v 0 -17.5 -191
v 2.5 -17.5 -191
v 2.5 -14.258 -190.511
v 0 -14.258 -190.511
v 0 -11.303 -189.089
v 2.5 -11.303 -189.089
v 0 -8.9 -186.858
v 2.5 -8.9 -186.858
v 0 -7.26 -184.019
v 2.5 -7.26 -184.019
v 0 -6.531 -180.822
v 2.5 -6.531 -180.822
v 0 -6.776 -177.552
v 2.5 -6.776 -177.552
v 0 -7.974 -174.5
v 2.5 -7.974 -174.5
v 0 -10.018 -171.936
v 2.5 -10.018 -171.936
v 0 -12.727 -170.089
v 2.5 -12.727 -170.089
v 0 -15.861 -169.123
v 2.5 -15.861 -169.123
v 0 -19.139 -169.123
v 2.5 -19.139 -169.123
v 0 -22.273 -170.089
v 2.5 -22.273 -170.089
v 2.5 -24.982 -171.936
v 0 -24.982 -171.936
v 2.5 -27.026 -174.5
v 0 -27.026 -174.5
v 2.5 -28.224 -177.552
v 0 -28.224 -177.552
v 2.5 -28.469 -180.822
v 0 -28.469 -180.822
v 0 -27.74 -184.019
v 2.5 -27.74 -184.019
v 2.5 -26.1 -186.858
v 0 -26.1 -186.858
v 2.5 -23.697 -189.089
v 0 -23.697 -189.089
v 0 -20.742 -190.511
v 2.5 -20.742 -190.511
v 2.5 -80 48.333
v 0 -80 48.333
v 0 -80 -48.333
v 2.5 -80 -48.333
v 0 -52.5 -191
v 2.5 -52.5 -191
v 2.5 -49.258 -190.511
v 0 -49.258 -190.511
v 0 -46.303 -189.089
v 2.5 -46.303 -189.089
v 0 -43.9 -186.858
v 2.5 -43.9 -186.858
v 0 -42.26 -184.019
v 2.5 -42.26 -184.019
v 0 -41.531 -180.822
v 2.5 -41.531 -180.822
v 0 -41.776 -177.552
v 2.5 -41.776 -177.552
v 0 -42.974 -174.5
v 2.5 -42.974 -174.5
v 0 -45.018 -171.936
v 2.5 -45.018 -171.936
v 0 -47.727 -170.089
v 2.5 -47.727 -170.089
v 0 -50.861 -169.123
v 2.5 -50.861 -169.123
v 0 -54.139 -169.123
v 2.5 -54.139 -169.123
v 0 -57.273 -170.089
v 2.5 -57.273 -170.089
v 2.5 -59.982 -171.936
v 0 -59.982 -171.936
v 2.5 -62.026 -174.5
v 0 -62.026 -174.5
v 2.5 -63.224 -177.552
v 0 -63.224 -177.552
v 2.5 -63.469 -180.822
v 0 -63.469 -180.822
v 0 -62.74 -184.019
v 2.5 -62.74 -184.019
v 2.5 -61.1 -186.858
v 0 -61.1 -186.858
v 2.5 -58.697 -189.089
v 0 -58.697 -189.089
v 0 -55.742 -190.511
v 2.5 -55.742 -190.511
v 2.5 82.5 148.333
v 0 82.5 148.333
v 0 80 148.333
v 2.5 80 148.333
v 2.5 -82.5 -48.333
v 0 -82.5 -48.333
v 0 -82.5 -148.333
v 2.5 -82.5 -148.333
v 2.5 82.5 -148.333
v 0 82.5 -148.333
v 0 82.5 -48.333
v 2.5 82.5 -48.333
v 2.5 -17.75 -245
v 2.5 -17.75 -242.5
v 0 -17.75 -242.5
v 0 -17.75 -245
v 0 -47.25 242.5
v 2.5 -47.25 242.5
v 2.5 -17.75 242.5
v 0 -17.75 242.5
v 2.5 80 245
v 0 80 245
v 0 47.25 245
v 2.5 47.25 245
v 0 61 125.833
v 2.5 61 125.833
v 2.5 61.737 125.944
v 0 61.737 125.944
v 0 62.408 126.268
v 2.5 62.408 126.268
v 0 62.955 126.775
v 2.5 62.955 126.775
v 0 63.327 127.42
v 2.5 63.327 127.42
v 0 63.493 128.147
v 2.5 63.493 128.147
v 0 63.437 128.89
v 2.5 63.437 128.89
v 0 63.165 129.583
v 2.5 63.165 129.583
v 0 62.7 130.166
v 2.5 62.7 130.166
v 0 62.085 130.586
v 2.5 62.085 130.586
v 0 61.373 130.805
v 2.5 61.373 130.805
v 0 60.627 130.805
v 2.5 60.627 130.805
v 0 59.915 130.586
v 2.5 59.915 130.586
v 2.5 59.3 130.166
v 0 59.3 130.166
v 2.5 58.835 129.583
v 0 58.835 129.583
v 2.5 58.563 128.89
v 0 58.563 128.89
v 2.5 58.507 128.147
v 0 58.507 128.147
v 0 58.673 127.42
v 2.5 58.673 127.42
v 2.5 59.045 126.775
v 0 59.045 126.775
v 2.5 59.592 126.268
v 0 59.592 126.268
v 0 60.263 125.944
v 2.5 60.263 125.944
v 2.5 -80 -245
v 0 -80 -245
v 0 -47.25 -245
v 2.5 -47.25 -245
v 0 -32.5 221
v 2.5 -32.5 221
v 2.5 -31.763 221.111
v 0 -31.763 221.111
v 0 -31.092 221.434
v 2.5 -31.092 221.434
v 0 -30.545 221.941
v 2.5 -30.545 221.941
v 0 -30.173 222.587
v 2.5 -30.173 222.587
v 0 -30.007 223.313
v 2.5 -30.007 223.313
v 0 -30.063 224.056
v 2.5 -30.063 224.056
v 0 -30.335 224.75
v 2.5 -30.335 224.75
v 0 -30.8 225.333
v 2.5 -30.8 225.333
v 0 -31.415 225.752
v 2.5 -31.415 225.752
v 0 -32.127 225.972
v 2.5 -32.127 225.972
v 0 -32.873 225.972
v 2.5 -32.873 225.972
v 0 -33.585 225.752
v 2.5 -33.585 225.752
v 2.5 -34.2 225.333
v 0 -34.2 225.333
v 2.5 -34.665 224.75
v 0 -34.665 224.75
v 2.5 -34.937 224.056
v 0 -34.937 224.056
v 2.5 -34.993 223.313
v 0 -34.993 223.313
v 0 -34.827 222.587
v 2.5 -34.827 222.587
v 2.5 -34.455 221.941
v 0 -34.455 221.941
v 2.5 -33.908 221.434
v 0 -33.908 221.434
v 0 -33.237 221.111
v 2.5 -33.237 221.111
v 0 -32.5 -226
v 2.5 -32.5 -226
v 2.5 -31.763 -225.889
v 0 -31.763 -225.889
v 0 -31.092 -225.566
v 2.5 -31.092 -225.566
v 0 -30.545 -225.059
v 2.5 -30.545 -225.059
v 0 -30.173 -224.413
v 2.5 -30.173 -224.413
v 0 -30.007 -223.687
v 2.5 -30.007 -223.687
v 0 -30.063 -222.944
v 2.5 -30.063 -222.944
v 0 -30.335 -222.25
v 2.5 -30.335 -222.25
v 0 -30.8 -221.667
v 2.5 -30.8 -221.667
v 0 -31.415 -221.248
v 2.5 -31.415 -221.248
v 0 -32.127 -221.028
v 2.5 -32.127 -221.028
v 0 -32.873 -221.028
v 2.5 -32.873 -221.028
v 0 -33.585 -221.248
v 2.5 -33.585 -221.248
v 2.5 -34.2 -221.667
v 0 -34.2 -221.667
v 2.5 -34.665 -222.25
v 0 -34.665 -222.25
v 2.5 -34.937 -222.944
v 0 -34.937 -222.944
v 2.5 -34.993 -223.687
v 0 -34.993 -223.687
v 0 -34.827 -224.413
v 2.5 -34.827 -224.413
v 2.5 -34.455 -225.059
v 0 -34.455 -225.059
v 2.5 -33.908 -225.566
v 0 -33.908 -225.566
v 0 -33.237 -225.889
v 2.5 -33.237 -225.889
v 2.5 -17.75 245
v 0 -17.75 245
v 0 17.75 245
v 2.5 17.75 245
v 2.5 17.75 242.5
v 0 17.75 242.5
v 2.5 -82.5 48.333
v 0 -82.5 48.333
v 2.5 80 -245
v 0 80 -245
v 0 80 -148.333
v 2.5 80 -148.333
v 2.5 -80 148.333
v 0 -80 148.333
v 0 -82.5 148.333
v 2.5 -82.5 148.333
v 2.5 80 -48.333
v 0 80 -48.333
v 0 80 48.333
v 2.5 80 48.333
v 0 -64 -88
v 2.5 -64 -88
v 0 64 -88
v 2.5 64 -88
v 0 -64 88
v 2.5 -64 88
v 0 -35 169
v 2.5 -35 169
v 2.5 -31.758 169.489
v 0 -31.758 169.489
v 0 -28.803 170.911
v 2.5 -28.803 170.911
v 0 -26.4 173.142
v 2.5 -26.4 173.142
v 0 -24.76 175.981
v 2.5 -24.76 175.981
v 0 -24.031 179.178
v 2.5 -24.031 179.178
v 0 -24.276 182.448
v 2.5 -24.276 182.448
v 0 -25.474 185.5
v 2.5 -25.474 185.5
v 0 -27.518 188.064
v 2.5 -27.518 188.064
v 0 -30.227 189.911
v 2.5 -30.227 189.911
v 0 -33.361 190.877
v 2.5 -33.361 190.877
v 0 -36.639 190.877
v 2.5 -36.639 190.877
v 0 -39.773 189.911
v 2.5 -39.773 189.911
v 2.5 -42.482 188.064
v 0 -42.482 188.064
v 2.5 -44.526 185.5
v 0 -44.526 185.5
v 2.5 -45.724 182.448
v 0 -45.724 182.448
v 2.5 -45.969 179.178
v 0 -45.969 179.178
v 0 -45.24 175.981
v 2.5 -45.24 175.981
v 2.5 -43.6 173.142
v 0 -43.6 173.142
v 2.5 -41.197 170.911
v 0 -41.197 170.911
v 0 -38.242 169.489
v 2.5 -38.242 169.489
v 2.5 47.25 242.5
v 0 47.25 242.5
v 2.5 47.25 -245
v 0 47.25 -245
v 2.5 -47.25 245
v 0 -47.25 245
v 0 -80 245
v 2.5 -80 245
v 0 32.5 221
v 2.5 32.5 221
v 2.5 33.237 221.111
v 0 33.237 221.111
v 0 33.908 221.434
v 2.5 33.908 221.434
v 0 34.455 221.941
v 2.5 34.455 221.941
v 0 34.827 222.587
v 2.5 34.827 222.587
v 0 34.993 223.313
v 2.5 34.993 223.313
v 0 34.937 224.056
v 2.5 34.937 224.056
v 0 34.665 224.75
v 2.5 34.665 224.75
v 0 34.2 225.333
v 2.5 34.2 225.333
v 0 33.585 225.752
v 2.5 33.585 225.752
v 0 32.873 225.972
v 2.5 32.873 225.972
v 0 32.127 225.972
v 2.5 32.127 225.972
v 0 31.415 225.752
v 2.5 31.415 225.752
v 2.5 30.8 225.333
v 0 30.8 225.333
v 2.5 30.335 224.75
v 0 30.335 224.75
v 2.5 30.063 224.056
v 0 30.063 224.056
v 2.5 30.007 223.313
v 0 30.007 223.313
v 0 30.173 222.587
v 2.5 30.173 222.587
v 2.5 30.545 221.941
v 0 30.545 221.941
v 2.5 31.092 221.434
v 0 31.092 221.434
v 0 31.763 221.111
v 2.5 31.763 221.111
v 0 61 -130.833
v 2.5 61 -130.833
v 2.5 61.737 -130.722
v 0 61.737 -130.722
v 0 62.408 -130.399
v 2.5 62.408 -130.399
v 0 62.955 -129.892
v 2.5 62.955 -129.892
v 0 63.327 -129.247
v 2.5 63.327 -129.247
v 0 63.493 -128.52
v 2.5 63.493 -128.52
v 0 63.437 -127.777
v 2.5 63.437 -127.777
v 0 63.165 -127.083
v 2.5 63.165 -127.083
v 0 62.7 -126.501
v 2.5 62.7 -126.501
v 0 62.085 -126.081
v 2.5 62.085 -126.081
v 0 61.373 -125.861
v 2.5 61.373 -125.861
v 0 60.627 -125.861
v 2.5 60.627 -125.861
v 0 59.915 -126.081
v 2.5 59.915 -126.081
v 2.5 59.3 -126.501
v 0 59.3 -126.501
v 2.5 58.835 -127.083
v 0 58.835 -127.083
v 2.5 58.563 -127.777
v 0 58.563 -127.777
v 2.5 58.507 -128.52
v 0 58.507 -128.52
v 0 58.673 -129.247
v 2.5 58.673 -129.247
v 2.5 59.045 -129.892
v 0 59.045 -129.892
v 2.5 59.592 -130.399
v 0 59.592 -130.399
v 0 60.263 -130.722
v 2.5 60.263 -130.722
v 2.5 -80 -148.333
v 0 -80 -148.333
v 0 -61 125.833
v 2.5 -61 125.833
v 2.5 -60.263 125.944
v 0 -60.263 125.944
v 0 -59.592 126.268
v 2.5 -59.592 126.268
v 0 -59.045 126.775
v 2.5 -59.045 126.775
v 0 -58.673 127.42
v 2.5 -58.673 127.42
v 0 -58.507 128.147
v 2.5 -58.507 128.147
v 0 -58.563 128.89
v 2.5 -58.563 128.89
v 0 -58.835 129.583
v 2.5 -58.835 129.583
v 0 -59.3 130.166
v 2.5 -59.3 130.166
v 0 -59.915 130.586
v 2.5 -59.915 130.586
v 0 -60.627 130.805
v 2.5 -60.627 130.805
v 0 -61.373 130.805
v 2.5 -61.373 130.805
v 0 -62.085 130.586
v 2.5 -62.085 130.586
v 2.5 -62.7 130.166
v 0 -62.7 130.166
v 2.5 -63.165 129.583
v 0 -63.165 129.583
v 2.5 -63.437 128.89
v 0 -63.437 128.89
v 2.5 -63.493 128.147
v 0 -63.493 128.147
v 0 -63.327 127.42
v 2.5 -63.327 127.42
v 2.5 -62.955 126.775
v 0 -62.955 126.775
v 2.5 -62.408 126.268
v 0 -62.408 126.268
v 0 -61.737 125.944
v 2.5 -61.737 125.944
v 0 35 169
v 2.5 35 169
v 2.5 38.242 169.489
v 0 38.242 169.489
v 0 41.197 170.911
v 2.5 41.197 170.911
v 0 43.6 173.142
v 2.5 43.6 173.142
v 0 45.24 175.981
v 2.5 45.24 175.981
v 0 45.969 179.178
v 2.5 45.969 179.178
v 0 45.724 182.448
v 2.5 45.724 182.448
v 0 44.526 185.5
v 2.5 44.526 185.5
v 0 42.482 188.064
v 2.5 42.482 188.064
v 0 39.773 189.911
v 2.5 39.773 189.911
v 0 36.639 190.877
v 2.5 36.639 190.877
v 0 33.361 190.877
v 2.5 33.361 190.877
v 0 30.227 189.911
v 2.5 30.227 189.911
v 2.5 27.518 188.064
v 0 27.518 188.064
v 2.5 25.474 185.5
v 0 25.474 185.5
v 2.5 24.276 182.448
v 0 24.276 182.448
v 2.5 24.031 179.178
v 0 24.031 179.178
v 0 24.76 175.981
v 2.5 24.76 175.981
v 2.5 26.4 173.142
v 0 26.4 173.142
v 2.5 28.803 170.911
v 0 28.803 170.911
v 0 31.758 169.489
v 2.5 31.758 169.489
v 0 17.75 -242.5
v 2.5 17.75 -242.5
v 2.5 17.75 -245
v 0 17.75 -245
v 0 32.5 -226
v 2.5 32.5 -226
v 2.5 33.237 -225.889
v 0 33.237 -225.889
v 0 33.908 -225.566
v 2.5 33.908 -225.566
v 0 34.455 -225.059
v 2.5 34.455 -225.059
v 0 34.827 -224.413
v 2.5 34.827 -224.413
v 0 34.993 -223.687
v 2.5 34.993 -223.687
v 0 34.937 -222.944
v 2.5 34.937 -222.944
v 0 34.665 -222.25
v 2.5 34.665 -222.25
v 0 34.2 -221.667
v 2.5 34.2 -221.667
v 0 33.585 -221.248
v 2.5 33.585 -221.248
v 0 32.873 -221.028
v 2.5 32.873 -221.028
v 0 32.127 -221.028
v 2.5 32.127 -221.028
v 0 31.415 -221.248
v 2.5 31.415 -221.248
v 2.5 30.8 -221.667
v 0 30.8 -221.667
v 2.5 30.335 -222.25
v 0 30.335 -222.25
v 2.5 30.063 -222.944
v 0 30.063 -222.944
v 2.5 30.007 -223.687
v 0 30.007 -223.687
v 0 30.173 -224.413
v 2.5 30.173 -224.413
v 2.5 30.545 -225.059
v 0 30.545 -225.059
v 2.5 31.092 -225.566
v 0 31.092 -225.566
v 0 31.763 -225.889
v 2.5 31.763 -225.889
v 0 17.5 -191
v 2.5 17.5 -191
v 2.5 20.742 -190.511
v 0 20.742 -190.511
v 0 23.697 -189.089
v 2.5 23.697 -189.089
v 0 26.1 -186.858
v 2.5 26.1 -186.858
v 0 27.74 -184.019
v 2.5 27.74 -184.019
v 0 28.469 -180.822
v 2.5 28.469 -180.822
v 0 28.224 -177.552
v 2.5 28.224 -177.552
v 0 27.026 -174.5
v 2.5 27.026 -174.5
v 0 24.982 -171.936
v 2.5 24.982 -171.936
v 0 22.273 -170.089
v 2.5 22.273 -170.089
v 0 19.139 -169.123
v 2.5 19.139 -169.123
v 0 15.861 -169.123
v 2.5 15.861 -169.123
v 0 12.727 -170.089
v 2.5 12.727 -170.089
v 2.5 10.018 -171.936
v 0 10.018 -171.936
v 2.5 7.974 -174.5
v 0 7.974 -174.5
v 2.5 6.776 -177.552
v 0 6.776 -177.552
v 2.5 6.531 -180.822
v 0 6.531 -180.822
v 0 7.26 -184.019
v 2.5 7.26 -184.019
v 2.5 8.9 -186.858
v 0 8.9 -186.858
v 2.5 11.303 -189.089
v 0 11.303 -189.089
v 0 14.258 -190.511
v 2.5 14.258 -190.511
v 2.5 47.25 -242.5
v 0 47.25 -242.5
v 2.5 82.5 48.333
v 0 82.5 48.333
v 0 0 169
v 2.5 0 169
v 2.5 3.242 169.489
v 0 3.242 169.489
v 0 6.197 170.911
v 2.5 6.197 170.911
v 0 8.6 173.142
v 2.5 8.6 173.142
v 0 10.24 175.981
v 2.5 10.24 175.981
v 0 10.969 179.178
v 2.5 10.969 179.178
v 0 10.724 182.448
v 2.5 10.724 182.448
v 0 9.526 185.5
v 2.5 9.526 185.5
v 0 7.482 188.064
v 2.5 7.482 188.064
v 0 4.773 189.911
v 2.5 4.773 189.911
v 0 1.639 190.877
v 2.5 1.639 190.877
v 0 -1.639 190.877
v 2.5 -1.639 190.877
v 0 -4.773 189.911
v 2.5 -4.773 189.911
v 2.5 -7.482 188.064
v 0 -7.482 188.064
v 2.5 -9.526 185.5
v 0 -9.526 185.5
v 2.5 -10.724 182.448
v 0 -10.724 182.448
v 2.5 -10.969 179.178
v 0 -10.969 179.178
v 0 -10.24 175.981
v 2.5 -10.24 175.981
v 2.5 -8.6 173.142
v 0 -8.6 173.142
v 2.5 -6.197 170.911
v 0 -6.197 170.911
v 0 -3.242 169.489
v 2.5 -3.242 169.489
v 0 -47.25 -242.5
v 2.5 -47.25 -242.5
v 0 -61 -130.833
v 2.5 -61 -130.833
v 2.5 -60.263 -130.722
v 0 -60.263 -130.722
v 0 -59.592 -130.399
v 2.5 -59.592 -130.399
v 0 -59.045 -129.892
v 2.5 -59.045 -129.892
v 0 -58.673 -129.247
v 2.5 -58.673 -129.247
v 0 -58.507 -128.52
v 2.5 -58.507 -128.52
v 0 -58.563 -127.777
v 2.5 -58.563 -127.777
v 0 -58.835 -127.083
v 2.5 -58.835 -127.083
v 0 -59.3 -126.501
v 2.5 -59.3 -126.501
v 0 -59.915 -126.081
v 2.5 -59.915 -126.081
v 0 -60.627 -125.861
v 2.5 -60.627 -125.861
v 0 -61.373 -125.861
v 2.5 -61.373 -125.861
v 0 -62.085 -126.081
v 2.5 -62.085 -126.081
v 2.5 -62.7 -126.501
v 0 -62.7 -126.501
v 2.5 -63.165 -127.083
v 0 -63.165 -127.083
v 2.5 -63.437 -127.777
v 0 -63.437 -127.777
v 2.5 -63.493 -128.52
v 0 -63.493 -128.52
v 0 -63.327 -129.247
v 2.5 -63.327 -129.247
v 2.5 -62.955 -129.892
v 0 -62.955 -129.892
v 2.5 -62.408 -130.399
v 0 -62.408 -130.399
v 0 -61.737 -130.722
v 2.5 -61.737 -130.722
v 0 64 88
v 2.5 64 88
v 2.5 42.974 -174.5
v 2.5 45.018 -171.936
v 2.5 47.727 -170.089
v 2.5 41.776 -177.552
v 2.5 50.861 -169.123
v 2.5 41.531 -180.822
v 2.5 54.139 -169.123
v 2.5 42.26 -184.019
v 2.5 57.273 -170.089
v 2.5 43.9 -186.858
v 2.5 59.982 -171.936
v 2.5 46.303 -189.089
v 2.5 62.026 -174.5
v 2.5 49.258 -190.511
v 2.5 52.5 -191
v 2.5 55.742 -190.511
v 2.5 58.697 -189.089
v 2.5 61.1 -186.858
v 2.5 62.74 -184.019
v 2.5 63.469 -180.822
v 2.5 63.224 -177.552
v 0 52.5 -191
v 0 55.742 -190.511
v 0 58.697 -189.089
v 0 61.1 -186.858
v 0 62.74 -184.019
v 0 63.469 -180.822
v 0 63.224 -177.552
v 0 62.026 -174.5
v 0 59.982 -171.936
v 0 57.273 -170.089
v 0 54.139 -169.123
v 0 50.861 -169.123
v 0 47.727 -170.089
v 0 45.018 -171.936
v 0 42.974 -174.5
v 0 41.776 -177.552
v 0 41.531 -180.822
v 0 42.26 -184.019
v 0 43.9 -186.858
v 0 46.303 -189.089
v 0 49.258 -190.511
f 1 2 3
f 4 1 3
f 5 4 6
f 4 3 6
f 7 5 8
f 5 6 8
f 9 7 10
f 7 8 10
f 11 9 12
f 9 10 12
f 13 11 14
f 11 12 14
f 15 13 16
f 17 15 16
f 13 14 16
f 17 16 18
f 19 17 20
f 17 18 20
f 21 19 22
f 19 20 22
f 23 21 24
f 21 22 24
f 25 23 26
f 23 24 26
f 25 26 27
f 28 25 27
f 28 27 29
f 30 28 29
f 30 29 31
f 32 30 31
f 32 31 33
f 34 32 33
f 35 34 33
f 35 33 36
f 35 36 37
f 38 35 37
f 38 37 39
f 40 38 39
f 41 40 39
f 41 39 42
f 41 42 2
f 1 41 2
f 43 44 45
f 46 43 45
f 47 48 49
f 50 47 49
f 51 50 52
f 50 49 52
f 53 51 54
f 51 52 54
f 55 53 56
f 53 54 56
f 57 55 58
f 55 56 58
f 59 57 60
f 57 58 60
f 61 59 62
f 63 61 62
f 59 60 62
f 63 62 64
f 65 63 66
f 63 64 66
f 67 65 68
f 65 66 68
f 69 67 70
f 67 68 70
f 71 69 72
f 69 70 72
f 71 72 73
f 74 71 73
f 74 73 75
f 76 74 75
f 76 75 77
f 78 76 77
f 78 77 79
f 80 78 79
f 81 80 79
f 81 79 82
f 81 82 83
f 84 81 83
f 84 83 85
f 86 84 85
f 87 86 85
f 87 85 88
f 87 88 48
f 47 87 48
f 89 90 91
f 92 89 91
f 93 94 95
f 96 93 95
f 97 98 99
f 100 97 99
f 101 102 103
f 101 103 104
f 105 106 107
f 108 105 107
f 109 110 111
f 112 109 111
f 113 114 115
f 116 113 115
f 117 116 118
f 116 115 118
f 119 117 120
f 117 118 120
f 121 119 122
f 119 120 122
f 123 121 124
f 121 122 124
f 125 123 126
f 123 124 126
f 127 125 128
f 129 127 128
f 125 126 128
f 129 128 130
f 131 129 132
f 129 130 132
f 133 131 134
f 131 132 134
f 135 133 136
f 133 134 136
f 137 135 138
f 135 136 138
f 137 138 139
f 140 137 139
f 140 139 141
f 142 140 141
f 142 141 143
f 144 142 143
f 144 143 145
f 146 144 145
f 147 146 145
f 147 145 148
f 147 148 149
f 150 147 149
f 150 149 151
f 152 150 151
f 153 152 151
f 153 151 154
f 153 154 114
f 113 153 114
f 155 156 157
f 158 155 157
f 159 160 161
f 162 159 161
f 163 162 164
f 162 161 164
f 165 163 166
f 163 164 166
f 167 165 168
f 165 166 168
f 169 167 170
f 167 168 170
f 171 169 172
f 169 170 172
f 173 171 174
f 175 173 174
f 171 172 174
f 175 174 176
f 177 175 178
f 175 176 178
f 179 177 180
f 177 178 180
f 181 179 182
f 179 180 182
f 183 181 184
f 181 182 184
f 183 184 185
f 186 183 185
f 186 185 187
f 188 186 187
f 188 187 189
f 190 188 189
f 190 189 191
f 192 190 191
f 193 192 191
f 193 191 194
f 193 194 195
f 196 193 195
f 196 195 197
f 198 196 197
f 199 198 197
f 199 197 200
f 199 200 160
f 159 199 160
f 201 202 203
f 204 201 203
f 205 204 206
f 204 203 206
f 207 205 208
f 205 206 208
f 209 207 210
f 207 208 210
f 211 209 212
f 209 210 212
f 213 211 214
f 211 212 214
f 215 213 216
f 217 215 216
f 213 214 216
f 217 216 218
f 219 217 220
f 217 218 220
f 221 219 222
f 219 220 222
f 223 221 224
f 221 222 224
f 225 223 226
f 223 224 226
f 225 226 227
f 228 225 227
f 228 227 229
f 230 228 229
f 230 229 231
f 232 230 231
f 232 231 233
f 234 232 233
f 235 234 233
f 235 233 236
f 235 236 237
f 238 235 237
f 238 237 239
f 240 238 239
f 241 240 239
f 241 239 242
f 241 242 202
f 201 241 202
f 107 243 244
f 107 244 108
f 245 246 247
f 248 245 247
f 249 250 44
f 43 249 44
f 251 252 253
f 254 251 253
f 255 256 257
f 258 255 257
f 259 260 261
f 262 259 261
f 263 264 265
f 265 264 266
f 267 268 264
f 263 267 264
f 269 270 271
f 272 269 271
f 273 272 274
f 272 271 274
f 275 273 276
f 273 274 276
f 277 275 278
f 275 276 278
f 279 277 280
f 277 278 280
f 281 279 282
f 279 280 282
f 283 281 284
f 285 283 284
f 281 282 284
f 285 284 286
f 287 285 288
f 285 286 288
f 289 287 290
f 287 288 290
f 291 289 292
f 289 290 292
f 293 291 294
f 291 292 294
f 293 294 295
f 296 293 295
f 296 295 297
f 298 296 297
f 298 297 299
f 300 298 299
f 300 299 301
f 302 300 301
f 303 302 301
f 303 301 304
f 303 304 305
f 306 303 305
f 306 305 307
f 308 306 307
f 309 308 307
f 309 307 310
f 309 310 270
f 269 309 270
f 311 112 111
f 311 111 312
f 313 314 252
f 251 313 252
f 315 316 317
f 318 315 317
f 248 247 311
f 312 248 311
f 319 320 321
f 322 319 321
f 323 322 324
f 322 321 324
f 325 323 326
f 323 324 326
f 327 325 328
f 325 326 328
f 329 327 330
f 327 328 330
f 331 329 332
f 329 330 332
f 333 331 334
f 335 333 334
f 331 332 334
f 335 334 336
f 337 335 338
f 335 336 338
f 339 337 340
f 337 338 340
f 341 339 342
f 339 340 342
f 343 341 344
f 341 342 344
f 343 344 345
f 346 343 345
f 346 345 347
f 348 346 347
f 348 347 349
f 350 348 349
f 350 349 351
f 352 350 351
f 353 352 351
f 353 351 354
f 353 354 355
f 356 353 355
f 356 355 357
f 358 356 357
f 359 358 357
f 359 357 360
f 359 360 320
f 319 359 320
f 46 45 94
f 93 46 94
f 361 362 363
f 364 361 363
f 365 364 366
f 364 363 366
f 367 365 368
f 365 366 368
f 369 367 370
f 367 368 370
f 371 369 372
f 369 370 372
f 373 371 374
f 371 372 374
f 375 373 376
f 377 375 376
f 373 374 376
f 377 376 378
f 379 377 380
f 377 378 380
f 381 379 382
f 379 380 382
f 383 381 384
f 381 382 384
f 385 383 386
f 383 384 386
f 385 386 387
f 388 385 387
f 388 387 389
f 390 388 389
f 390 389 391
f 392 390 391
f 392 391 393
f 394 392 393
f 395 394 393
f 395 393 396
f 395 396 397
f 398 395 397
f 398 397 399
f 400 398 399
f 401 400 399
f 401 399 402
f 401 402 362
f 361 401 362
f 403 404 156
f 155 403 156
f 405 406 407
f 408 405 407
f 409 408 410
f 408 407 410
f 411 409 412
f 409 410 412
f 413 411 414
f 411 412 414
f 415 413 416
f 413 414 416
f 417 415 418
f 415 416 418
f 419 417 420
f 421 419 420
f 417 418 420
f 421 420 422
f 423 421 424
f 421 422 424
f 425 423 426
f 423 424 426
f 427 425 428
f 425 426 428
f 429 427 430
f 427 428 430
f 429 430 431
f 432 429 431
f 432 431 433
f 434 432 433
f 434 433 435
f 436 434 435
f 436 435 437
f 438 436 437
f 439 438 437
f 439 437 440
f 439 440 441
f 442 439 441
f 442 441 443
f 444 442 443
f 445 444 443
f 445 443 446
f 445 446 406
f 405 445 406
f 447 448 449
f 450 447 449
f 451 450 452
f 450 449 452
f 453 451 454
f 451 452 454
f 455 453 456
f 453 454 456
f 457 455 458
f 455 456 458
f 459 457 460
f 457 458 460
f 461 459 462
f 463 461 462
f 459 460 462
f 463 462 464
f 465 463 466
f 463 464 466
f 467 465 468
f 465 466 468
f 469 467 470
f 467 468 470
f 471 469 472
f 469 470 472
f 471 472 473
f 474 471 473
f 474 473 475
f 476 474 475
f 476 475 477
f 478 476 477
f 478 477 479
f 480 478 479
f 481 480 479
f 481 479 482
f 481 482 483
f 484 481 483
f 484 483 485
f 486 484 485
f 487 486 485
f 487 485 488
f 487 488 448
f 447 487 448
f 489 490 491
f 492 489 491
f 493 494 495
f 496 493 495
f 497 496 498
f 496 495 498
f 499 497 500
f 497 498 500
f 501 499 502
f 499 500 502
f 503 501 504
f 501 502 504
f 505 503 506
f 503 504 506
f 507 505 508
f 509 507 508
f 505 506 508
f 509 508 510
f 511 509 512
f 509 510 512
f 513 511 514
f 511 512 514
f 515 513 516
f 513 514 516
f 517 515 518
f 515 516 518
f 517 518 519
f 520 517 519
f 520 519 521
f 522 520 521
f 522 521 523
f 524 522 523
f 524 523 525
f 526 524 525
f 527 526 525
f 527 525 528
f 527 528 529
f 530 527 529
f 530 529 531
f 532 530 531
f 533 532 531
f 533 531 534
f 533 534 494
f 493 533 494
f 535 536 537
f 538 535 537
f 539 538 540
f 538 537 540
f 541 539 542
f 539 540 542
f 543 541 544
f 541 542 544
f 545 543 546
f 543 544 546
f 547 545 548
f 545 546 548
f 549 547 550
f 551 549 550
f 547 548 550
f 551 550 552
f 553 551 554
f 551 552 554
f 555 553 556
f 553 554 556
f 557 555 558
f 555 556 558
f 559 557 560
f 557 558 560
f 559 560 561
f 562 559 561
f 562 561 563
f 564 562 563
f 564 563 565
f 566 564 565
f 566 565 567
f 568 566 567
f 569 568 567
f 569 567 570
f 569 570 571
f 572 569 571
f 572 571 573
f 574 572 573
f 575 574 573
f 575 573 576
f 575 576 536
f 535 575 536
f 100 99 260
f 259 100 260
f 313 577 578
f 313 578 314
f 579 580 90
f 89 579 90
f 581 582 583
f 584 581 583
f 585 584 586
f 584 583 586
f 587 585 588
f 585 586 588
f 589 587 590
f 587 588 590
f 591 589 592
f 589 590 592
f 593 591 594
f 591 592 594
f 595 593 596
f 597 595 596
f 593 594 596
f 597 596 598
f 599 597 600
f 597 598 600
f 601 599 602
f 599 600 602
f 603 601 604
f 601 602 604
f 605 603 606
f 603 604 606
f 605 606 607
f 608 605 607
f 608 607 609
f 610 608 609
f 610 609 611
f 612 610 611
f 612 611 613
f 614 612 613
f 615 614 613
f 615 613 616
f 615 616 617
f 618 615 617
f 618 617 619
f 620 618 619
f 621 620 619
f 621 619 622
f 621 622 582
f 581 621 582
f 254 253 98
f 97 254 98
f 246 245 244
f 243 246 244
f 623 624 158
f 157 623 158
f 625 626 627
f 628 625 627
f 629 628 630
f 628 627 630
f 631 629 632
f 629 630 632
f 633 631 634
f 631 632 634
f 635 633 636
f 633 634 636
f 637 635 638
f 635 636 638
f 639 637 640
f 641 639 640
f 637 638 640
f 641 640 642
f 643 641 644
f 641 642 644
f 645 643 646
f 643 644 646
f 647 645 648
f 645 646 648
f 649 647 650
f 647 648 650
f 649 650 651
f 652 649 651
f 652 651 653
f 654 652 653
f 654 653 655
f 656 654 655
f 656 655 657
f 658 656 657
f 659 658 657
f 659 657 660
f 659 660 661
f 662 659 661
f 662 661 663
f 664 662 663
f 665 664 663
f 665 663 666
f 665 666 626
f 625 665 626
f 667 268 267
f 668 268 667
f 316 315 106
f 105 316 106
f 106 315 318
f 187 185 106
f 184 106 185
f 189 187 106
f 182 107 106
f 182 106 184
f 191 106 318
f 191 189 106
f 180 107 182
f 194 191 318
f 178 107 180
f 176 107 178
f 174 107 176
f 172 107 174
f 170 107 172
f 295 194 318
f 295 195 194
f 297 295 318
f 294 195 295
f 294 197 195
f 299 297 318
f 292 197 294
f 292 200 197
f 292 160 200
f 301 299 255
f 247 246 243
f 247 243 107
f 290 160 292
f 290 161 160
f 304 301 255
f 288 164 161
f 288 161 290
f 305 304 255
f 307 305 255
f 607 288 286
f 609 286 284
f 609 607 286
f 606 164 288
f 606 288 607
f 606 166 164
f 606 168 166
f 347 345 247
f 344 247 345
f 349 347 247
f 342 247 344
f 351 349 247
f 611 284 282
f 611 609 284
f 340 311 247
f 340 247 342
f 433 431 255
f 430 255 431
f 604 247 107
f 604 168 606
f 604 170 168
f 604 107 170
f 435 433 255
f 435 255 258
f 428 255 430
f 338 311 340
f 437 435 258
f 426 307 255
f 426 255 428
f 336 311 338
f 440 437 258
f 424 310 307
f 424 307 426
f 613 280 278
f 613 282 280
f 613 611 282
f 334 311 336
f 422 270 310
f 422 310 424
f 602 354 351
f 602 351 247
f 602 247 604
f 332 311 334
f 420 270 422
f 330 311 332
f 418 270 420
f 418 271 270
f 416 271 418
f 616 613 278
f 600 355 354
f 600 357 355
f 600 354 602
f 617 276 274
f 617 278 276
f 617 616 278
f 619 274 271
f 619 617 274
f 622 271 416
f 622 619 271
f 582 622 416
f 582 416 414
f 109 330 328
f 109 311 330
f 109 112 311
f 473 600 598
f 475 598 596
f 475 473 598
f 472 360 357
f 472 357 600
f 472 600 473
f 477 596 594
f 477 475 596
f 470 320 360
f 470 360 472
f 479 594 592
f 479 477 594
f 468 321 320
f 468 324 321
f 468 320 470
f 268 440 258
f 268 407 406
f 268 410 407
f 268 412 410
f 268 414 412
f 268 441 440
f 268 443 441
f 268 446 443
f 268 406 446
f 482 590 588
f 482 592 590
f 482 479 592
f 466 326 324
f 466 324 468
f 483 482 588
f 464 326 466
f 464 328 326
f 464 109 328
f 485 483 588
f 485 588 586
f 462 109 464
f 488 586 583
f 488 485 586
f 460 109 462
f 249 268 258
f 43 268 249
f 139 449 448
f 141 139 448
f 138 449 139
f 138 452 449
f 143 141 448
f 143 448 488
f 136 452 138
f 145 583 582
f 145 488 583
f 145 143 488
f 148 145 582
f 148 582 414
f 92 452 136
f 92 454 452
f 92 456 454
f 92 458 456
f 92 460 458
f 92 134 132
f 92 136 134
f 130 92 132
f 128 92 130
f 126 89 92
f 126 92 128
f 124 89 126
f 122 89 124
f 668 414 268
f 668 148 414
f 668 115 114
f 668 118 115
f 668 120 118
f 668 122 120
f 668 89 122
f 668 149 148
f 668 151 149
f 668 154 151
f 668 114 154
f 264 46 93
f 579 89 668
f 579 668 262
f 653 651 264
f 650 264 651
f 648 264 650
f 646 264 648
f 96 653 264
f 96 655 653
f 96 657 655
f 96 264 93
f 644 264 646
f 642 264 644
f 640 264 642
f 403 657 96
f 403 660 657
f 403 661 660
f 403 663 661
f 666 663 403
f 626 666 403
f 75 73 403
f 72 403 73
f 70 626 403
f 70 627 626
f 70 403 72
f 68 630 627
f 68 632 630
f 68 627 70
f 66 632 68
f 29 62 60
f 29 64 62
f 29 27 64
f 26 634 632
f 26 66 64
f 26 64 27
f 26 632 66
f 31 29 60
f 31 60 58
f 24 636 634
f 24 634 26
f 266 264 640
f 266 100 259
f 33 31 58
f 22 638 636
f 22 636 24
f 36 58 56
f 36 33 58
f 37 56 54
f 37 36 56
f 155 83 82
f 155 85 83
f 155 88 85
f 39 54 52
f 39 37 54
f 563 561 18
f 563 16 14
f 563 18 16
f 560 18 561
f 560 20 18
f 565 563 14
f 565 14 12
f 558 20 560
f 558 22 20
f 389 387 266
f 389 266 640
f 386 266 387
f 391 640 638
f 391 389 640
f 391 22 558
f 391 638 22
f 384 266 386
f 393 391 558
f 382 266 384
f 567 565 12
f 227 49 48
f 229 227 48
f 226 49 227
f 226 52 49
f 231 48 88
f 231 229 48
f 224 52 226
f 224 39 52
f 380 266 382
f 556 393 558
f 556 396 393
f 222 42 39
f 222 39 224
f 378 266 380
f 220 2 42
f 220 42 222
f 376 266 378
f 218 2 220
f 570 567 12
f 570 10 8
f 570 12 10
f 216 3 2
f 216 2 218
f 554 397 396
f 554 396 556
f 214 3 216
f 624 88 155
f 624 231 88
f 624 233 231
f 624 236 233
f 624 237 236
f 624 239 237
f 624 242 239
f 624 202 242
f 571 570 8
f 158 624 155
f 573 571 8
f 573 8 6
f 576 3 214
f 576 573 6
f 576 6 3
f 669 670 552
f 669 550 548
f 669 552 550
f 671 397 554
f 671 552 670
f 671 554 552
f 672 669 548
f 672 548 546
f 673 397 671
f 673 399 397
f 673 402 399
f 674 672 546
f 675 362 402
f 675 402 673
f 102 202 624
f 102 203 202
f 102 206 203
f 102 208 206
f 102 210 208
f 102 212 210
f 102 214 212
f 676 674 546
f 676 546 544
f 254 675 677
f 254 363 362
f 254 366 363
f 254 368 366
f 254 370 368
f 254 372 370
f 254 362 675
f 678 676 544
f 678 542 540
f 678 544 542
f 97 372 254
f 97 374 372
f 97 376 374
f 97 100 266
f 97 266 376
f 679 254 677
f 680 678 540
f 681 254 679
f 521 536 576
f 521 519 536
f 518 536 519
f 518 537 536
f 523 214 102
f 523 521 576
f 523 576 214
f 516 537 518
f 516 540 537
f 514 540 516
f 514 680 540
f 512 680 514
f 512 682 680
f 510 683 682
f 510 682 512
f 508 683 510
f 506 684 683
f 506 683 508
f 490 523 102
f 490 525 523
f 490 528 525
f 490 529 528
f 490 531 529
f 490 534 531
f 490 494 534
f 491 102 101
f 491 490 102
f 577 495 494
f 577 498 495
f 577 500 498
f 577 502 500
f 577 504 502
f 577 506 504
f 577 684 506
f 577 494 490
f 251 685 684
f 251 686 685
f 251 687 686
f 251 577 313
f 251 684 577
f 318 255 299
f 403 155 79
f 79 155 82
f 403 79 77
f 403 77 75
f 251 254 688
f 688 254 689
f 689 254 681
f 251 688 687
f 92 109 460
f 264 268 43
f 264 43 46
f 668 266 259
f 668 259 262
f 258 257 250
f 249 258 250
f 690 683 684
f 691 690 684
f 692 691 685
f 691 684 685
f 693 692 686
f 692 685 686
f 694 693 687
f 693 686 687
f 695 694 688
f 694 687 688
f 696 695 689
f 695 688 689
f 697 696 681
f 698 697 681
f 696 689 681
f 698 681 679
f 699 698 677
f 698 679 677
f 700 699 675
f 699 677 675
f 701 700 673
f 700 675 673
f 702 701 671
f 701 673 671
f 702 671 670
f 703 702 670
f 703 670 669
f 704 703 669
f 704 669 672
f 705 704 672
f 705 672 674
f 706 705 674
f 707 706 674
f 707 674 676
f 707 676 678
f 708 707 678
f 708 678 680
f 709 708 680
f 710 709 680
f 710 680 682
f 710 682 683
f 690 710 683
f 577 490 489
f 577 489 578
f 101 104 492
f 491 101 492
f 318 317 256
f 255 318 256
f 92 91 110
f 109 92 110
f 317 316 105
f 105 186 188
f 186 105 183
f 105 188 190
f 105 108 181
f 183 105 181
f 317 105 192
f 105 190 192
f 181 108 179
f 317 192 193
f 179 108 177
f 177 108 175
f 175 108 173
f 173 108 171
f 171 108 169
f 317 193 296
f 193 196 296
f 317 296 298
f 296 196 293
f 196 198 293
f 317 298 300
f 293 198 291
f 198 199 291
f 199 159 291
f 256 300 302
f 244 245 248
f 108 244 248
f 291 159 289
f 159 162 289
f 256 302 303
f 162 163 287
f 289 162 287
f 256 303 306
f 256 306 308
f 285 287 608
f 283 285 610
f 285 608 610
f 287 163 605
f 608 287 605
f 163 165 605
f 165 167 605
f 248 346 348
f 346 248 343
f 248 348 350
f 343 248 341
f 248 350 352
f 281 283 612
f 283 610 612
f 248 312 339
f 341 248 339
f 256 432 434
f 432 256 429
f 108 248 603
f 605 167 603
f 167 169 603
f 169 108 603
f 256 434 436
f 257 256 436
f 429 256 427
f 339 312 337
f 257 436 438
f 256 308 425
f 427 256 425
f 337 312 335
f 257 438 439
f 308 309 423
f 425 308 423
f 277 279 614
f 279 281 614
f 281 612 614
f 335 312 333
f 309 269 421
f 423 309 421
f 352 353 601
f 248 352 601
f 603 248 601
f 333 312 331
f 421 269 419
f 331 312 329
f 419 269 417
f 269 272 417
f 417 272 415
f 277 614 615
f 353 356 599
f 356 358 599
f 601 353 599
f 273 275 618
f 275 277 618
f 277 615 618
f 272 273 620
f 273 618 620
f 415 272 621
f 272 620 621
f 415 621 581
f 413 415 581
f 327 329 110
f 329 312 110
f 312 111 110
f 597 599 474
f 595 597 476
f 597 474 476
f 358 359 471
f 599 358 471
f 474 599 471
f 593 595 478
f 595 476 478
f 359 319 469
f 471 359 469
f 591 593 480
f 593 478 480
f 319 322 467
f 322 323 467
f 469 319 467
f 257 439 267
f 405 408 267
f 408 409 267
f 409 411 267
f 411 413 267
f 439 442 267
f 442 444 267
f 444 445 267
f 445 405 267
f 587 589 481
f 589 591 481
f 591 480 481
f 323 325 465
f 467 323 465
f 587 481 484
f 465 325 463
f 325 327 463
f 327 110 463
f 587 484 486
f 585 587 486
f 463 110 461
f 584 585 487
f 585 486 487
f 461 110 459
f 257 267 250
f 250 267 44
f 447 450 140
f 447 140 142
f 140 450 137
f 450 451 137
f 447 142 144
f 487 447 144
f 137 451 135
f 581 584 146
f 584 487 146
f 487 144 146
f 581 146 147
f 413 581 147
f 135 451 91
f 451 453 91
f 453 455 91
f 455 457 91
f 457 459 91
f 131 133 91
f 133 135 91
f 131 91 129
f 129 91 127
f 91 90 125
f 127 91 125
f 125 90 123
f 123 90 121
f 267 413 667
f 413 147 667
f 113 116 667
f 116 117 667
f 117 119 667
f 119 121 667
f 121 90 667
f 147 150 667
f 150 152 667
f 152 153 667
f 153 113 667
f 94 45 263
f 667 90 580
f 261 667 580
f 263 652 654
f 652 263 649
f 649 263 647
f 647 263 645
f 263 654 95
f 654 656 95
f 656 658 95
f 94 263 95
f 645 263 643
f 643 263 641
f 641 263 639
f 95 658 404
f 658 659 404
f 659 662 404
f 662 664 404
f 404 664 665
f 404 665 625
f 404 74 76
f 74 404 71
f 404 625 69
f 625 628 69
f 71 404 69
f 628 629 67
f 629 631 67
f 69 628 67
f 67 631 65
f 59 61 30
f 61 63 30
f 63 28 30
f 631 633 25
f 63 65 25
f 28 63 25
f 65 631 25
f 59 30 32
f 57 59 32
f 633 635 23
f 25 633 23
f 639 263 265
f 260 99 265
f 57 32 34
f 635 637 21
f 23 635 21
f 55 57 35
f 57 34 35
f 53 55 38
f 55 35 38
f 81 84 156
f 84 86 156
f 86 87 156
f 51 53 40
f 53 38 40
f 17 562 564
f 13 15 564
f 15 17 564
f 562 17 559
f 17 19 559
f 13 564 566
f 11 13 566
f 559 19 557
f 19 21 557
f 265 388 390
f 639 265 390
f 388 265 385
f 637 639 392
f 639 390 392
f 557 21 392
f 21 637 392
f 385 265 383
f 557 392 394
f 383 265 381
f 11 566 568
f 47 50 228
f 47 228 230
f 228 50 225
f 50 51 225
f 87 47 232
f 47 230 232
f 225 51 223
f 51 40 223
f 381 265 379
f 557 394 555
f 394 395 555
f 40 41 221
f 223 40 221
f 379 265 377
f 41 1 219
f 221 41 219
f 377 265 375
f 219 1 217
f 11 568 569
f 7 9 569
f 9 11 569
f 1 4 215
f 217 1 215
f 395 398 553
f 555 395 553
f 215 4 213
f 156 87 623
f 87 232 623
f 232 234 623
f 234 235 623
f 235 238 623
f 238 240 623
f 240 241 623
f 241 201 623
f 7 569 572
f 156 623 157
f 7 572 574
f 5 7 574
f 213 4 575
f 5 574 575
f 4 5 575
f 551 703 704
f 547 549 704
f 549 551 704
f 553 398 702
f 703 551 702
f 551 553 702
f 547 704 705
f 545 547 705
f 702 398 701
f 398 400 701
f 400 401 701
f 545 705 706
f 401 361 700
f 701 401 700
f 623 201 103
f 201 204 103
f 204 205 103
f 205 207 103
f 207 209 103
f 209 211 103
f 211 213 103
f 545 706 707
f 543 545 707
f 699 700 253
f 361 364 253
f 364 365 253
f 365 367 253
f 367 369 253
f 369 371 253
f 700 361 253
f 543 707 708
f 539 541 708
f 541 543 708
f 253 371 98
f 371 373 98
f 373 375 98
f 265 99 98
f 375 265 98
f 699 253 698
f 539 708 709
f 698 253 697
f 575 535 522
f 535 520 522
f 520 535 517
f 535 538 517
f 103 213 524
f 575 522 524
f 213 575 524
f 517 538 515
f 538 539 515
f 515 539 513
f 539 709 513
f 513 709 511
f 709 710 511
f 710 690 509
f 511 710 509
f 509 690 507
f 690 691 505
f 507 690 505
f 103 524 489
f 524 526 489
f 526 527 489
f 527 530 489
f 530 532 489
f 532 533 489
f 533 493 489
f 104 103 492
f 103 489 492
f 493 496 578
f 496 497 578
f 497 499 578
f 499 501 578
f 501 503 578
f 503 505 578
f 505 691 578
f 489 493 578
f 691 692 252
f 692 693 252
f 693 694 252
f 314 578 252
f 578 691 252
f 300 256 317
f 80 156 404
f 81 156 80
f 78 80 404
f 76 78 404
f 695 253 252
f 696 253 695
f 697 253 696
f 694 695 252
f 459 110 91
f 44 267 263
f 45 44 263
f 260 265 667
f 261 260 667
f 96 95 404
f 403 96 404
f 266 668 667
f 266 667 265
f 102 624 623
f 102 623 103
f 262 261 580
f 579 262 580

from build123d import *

# Parameters (mm, degrees)
BOSS_EXTRUDE1_DEPTH = 2.5
SKETCH2_R           = 2.5
SKETCH2_R_2         = 11
SKETCH2_W           = 2.5
SKETCH2_H           = 29.5
SKETCH2_W_2         = 176
SKETCH2_H_2         = 128
CUT_EXTRUDE1_DEPTH  = 3


with BuildPart() as part:
    # Sketch1 → Boss-Extrude1 (new body)
    with BuildSketch(Plane(origin=(0, 0, 0), x_dir=(0, 0, -1), z_dir=(1, 0, 0))):
        Polygon((-245, -80), (-148.333333333, -80), (-148.333333333, -82.5), (-48.333333333, -82.5), (-48.333333333, -80), (48.333333333, -80), (48.333333333, -82.5), (148.333333333, -82.5), (148.333333333, -80), (245, -80), (245, 80), (148.333333333, 80), (148.333333333, 82.5), (48.333333333, 82.5), (48.333333333, 80), (-48.333333333, 80), (-48.333333333, 82.5), (-148.333333333, 82.5), (-148.333333333, 80), (-245, 80), align=None)
    extrude(amount=BOSS_EXTRUDE1_DEPTH)

    # Sketch2 → Cut-Extrude1 (cut)
    with BuildSketch(Plane(origin=(2.5, 0, 0), x_dir=(0, 0, -1), z_dir=(1, 0, 0))):
        with Locations((-128.333333333, 61)):
            Circle(SKETCH2_R)
        with Locations((128.333333333, 61)):
            Circle(SKETCH2_R)
        with Locations((128.333333333, -61)):
            Circle(SKETCH2_R)
        with Locations((-128.333333333, -61)):
            Circle(SKETCH2_R)
        with Locations((-223.5, 32.5)):
            Circle(SKETCH2_R)
        with Locations((-223.5, -32.5)):
            Circle(SKETCH2_R)
        with Locations((223.5, 32.5)):
            Circle(SKETCH2_R)
        with Locations((223.5, -32.5)):
            Circle(SKETCH2_R)
        with Locations((-180, 35)):
            Circle(SKETCH2_R_2)
        with Locations((-180, 0)):
            Circle(SKETCH2_R_2)
        with Locations((-180, -35)):
            Circle(SKETCH2_R_2)
        with Locations((180, 17.5)):
            Circle(SKETCH2_R_2)
        with Locations((180, 52.5)):
            Circle(SKETCH2_R_2)
        with Locations((180, -17.5)):
            Circle(SKETCH2_R_2)
        with Locations((180, -52.5)):
            Circle(SKETCH2_R_2)
        with Locations((-243.75, 32.5)):
            Rectangle(SKETCH2_W, SKETCH2_H)
        with Locations((-243.75, -32.5)):
            Rectangle(SKETCH2_W, SKETCH2_H)
        with Locations((243.75, -32.5)):
            Rectangle(SKETCH2_W, SKETCH2_H)
        with Locations((243.75, 32.5)):
            Rectangle(SKETCH2_W, SKETCH2_H)
        Rectangle(SKETCH2_W_2, SKETCH2_H_2)
    extrude(amount=-CUT_EXTRUDE1_DEPTH, mode=Mode.SUBTRACT)


solid = part.part
